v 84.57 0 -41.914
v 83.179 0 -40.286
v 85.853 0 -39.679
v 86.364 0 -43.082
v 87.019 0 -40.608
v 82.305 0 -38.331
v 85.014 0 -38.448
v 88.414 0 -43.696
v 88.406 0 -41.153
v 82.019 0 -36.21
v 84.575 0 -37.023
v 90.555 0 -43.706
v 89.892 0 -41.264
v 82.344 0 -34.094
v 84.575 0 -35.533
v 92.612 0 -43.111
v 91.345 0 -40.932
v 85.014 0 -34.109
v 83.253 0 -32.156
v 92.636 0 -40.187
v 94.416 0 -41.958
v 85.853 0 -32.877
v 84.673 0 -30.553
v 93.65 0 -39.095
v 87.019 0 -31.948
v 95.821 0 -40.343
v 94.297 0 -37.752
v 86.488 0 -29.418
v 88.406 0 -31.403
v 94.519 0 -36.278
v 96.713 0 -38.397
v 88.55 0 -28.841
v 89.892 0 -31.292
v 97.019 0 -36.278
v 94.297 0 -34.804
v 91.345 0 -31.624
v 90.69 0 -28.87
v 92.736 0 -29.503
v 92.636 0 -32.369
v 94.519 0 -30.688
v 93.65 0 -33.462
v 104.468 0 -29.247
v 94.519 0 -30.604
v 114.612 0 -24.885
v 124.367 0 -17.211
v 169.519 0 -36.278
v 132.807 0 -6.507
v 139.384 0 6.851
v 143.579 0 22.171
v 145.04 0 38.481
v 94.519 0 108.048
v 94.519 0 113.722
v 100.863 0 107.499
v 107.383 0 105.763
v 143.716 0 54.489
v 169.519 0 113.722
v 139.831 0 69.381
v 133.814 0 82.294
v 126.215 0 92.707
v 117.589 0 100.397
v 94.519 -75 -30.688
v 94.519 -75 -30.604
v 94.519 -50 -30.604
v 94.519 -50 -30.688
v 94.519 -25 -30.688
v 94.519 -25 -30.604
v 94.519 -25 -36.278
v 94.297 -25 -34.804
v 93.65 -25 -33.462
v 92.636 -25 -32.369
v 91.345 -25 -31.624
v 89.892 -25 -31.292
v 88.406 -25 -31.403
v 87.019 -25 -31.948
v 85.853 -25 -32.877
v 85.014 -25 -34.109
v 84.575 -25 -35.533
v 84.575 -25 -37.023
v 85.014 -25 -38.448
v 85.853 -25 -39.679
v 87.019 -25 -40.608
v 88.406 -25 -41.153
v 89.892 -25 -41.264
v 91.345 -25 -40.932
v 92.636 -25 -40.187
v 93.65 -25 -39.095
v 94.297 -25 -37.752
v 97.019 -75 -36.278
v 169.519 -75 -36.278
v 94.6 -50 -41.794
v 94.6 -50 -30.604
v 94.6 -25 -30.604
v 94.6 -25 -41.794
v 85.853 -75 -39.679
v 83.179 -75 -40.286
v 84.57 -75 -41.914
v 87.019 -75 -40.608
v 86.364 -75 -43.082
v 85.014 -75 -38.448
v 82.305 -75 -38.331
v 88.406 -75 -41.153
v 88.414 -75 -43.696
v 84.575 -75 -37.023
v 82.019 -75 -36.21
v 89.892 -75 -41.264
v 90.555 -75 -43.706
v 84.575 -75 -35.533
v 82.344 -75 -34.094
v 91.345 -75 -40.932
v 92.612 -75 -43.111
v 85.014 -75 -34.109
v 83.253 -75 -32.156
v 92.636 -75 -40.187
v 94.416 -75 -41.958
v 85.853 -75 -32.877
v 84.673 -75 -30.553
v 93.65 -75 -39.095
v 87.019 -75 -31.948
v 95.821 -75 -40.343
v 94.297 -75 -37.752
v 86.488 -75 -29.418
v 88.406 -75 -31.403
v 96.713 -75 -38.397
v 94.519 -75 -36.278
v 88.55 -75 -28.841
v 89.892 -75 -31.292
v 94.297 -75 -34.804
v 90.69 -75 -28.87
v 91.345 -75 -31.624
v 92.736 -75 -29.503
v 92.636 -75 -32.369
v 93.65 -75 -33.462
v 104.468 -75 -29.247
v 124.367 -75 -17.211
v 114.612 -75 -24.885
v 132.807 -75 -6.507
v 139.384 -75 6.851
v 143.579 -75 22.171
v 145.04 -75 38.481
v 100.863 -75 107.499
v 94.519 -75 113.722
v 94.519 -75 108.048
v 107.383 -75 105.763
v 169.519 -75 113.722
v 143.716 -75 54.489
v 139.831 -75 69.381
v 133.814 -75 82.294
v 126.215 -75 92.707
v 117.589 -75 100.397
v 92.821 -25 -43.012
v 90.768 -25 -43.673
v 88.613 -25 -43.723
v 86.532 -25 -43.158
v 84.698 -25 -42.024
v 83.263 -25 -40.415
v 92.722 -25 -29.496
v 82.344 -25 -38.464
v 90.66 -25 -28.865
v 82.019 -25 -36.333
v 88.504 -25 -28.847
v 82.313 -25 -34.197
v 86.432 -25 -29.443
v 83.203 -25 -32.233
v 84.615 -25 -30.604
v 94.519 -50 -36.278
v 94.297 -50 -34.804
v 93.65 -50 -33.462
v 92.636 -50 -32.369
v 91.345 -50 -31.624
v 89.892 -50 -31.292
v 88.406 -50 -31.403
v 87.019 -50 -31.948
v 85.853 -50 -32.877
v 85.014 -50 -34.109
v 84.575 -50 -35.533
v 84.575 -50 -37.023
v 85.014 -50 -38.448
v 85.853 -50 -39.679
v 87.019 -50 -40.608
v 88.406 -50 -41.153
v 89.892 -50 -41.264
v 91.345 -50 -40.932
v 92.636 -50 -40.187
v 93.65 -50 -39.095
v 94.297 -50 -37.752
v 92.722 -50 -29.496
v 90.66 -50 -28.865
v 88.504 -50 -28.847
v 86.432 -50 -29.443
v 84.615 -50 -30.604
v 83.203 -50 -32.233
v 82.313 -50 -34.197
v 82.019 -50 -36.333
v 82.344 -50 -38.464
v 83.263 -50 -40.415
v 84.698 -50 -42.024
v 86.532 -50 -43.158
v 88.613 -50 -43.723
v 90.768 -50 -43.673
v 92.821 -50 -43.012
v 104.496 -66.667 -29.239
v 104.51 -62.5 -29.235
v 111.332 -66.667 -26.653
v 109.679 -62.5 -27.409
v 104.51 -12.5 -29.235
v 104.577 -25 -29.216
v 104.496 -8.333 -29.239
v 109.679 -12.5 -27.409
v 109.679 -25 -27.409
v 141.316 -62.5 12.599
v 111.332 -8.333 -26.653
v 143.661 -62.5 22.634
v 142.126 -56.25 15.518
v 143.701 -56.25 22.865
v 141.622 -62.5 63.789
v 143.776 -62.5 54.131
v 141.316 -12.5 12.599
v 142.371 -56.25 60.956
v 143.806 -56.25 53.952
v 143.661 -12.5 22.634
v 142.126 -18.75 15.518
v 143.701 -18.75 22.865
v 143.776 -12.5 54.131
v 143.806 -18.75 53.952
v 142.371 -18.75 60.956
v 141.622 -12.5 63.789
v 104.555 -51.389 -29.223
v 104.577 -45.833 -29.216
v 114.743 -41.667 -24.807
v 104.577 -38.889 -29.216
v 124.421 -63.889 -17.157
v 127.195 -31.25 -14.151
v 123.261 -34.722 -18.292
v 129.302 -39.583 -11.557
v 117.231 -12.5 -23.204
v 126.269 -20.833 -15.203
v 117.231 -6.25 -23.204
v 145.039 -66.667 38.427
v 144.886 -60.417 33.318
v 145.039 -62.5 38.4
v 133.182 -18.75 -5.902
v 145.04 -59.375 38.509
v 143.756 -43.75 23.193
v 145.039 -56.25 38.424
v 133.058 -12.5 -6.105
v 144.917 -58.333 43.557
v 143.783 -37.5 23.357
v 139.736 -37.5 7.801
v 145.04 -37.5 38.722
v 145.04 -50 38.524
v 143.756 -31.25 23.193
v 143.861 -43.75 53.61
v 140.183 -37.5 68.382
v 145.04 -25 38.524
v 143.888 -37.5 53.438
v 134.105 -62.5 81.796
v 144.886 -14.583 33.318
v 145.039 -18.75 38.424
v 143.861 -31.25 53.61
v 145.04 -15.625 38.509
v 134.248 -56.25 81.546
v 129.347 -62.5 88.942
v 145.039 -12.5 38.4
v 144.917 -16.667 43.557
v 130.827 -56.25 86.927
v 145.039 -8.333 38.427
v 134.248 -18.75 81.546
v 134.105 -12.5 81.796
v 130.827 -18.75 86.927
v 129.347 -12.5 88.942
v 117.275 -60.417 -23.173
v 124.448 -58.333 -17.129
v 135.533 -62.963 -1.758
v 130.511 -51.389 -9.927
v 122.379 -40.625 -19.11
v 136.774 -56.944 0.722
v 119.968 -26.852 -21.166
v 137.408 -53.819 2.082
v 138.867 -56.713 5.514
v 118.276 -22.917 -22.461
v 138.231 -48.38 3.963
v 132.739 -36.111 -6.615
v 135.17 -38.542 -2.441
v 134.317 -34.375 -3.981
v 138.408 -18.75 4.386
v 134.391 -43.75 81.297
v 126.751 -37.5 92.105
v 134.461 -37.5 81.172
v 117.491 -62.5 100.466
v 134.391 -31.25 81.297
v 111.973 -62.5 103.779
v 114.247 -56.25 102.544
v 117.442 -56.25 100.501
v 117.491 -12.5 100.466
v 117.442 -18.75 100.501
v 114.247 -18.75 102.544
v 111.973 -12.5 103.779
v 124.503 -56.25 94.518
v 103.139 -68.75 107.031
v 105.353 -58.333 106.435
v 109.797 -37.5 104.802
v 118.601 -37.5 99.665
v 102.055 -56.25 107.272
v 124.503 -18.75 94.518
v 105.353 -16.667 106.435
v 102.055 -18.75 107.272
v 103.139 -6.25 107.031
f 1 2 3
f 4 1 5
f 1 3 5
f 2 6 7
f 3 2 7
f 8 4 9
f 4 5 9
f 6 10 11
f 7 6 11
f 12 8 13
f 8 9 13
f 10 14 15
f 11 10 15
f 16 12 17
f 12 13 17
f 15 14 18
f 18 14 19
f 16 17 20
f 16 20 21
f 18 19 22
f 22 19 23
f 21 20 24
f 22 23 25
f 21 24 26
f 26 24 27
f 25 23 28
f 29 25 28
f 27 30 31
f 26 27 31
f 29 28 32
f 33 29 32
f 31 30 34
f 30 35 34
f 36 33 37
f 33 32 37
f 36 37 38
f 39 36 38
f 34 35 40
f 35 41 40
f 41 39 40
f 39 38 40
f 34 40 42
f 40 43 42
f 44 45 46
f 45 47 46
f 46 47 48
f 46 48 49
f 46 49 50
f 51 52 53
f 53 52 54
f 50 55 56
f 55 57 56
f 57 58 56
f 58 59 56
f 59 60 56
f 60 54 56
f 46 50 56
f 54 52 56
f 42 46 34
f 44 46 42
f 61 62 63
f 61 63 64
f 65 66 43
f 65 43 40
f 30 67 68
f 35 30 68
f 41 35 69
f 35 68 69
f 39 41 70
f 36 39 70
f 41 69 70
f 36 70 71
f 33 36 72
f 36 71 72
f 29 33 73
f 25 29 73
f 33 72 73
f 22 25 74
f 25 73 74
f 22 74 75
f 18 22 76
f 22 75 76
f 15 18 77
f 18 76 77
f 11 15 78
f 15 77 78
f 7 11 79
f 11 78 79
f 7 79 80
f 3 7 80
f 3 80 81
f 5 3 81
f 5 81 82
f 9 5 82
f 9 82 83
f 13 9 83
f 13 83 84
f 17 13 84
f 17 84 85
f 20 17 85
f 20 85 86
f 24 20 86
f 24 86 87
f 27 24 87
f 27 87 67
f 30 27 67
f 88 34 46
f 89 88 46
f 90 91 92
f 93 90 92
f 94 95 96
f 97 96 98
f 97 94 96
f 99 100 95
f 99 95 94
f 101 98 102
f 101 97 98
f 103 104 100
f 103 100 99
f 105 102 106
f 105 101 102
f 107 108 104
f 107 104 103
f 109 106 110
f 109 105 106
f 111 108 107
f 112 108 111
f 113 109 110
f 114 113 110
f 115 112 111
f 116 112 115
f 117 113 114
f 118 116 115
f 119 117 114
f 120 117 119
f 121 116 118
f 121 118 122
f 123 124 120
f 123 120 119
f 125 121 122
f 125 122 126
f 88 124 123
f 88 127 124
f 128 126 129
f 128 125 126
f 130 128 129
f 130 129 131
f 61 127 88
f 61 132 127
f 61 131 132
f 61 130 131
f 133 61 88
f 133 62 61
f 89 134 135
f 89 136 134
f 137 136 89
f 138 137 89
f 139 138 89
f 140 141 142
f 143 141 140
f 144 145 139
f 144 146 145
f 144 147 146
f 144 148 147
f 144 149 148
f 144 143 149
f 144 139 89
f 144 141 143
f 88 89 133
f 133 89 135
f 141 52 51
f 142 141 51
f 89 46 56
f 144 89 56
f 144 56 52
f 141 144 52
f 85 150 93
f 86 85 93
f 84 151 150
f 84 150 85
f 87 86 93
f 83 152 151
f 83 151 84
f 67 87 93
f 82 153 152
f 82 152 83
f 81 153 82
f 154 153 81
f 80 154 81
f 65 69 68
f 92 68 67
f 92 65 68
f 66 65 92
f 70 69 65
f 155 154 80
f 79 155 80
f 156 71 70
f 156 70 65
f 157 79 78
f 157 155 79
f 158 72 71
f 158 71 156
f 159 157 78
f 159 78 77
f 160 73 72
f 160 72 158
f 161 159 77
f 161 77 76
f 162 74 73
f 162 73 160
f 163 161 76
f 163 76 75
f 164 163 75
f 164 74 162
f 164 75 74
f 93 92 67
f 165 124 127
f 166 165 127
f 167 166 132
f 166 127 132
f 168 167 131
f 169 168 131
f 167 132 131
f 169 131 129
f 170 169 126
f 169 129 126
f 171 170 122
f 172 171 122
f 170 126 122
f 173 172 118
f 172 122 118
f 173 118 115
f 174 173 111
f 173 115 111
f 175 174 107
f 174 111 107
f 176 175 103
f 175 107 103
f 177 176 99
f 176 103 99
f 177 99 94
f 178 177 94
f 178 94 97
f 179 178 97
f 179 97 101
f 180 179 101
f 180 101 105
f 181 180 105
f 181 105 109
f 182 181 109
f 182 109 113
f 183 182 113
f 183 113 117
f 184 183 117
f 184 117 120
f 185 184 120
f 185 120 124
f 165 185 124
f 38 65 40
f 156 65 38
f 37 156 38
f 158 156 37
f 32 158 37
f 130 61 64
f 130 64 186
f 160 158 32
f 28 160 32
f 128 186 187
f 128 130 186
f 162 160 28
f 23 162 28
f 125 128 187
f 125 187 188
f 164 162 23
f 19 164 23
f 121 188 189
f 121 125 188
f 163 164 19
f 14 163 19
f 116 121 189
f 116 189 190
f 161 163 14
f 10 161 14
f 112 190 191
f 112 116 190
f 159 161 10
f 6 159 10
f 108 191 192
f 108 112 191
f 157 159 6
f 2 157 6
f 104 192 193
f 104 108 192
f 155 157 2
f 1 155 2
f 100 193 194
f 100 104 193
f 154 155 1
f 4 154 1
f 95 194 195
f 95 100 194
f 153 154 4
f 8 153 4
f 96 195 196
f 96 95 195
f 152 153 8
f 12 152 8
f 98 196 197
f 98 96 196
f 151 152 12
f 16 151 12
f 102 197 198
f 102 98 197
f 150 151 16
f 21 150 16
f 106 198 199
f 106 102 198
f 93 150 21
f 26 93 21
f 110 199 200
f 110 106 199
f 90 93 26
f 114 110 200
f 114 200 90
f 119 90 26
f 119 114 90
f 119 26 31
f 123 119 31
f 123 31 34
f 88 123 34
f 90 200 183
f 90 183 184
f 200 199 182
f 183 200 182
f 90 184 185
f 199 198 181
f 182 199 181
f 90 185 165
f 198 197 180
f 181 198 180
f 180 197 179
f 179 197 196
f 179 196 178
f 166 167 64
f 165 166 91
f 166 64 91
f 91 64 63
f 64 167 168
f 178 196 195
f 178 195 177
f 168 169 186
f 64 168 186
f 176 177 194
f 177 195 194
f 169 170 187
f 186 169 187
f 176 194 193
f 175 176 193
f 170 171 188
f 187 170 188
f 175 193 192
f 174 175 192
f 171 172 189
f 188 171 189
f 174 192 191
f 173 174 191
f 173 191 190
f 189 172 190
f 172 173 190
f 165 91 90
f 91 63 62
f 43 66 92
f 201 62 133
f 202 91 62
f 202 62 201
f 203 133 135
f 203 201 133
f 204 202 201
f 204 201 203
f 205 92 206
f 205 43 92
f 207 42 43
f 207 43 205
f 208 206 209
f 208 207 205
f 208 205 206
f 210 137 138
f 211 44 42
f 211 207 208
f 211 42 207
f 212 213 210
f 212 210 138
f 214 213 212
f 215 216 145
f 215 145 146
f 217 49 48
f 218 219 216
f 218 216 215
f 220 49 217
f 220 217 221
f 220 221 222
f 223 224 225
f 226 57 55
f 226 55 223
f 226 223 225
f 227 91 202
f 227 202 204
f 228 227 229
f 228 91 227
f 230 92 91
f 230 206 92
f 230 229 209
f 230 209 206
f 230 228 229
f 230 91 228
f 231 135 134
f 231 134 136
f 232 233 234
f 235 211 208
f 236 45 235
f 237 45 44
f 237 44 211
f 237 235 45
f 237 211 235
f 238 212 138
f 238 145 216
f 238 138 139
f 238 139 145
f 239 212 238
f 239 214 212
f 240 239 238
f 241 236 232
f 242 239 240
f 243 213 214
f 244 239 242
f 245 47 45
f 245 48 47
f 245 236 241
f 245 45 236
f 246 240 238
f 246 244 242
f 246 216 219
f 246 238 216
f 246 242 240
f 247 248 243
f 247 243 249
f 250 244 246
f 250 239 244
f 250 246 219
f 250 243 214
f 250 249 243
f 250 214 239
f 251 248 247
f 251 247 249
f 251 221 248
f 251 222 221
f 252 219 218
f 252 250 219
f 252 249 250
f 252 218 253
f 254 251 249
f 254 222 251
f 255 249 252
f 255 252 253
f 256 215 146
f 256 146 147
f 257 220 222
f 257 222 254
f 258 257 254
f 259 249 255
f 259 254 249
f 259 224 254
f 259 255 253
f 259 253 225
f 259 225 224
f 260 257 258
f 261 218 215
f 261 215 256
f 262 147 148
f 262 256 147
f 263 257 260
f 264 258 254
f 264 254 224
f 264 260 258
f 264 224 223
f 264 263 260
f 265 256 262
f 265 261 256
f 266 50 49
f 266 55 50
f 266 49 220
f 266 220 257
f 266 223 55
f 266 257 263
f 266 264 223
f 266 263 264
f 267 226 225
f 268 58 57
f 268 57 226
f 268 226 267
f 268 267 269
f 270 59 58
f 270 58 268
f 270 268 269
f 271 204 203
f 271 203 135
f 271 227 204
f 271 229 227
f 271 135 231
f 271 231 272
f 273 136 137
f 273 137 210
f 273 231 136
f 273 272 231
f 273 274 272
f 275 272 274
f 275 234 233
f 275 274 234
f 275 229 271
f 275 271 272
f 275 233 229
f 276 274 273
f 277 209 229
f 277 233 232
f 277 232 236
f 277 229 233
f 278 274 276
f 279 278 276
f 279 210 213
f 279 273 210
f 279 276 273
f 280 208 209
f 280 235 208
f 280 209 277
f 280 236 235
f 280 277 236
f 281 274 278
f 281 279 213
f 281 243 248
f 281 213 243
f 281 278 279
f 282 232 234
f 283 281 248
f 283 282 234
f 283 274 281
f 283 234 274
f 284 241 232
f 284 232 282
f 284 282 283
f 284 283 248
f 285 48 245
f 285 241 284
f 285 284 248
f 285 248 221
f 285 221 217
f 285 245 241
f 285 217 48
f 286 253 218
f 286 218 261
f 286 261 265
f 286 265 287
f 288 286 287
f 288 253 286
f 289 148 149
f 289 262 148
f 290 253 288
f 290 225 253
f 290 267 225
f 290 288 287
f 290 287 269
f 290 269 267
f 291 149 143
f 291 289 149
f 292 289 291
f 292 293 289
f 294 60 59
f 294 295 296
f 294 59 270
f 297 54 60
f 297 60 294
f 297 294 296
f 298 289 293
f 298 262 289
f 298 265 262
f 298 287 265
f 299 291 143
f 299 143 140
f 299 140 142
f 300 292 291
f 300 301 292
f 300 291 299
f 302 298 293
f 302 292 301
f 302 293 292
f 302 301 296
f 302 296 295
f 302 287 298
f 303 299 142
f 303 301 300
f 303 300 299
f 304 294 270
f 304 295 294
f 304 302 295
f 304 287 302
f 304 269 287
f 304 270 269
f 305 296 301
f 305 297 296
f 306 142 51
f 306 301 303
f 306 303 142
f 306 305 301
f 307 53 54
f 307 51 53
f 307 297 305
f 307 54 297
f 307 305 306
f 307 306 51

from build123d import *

# Parameters (mm, degrees)
F1_DEPTH = 75
F3_DEPTH = 75
F4_R     = 5
F5_DEPTH = 75
F6_W     = 25
F6_H     = 50
F7_DEPTH = 94.6


with BuildPart() as f1:
    # F0 (on Front) → F1 (new body)
    with BuildSketch(Plane.XZ):
        with BuildLine():
            Line((94.518671182, -36.2781172018), (169.518671182, -36.2781172018))
            Line((169.518671182, -36.2781172018), (169.518671182, 113.7218827982))
            Line((169.518671182, 113.7218827982), (94.518671182, 113.7218827982))
            Line((94.518671182, 113.7218827982), (94.518671182, 108.0480078836))
            add(Edge.make_bspline(
                [(94.518671182, -30.6042422872), (145.0398997052, -30.6042422872), (145.0398997052, 38.7218827982), (145.0398997052, 108.0480078835), (94.518671182, 108.0480078836)],
                knots=[0, 0, 0, 1.5707963268, 1.5707963268, 3.1415926536, 3.1415926536, 3.1415926536], degree=2, weights=[1, 0.7071067812, 1, 0.7071067812, 1]))
            Line((94.518671182, -30.6042422872), (94.518671182, -36.2781172018))
        make_face()
    extrude(amount=F1_DEPTH)

    # F2 (on face) → F3 (join)
    with BuildSketch(Plane.XZ.offset(75)):
        with BuildLine():
            ThreePointArc((94.518671182, -30.6879472581), (82.6721392132, -39.3399793803), (97.018671182, -36.2781172018))
            Line((97.018671182, -36.2781172018), (94.518671182, -36.2781172018))
            Line((94.518671182, -36.2781172018), (94.518671182, -30.6879472581))
        make_face()
    extrude(amount=-F3_DEPTH)

    # F4 (on face) → F5 (cut)
    with BuildSketch(Plane.XZ.offset(75)):
        with Locations((89.518671182, -36.2781172018)):
            Circle(F4_R)
    extrude(amount=-F5_DEPTH, mode=Mode.SUBTRACT)

    # F6 (on Right) → F7 (cut)
    with BuildSketch(Plane.YZ):
        with Locations((-37.5, -41.2179514766)):
            Rectangle(F6_W, F6_H)
    extrude(amount=F7_DEPTH, mode=Mode.SUBTRACT)


solid = f1.part
